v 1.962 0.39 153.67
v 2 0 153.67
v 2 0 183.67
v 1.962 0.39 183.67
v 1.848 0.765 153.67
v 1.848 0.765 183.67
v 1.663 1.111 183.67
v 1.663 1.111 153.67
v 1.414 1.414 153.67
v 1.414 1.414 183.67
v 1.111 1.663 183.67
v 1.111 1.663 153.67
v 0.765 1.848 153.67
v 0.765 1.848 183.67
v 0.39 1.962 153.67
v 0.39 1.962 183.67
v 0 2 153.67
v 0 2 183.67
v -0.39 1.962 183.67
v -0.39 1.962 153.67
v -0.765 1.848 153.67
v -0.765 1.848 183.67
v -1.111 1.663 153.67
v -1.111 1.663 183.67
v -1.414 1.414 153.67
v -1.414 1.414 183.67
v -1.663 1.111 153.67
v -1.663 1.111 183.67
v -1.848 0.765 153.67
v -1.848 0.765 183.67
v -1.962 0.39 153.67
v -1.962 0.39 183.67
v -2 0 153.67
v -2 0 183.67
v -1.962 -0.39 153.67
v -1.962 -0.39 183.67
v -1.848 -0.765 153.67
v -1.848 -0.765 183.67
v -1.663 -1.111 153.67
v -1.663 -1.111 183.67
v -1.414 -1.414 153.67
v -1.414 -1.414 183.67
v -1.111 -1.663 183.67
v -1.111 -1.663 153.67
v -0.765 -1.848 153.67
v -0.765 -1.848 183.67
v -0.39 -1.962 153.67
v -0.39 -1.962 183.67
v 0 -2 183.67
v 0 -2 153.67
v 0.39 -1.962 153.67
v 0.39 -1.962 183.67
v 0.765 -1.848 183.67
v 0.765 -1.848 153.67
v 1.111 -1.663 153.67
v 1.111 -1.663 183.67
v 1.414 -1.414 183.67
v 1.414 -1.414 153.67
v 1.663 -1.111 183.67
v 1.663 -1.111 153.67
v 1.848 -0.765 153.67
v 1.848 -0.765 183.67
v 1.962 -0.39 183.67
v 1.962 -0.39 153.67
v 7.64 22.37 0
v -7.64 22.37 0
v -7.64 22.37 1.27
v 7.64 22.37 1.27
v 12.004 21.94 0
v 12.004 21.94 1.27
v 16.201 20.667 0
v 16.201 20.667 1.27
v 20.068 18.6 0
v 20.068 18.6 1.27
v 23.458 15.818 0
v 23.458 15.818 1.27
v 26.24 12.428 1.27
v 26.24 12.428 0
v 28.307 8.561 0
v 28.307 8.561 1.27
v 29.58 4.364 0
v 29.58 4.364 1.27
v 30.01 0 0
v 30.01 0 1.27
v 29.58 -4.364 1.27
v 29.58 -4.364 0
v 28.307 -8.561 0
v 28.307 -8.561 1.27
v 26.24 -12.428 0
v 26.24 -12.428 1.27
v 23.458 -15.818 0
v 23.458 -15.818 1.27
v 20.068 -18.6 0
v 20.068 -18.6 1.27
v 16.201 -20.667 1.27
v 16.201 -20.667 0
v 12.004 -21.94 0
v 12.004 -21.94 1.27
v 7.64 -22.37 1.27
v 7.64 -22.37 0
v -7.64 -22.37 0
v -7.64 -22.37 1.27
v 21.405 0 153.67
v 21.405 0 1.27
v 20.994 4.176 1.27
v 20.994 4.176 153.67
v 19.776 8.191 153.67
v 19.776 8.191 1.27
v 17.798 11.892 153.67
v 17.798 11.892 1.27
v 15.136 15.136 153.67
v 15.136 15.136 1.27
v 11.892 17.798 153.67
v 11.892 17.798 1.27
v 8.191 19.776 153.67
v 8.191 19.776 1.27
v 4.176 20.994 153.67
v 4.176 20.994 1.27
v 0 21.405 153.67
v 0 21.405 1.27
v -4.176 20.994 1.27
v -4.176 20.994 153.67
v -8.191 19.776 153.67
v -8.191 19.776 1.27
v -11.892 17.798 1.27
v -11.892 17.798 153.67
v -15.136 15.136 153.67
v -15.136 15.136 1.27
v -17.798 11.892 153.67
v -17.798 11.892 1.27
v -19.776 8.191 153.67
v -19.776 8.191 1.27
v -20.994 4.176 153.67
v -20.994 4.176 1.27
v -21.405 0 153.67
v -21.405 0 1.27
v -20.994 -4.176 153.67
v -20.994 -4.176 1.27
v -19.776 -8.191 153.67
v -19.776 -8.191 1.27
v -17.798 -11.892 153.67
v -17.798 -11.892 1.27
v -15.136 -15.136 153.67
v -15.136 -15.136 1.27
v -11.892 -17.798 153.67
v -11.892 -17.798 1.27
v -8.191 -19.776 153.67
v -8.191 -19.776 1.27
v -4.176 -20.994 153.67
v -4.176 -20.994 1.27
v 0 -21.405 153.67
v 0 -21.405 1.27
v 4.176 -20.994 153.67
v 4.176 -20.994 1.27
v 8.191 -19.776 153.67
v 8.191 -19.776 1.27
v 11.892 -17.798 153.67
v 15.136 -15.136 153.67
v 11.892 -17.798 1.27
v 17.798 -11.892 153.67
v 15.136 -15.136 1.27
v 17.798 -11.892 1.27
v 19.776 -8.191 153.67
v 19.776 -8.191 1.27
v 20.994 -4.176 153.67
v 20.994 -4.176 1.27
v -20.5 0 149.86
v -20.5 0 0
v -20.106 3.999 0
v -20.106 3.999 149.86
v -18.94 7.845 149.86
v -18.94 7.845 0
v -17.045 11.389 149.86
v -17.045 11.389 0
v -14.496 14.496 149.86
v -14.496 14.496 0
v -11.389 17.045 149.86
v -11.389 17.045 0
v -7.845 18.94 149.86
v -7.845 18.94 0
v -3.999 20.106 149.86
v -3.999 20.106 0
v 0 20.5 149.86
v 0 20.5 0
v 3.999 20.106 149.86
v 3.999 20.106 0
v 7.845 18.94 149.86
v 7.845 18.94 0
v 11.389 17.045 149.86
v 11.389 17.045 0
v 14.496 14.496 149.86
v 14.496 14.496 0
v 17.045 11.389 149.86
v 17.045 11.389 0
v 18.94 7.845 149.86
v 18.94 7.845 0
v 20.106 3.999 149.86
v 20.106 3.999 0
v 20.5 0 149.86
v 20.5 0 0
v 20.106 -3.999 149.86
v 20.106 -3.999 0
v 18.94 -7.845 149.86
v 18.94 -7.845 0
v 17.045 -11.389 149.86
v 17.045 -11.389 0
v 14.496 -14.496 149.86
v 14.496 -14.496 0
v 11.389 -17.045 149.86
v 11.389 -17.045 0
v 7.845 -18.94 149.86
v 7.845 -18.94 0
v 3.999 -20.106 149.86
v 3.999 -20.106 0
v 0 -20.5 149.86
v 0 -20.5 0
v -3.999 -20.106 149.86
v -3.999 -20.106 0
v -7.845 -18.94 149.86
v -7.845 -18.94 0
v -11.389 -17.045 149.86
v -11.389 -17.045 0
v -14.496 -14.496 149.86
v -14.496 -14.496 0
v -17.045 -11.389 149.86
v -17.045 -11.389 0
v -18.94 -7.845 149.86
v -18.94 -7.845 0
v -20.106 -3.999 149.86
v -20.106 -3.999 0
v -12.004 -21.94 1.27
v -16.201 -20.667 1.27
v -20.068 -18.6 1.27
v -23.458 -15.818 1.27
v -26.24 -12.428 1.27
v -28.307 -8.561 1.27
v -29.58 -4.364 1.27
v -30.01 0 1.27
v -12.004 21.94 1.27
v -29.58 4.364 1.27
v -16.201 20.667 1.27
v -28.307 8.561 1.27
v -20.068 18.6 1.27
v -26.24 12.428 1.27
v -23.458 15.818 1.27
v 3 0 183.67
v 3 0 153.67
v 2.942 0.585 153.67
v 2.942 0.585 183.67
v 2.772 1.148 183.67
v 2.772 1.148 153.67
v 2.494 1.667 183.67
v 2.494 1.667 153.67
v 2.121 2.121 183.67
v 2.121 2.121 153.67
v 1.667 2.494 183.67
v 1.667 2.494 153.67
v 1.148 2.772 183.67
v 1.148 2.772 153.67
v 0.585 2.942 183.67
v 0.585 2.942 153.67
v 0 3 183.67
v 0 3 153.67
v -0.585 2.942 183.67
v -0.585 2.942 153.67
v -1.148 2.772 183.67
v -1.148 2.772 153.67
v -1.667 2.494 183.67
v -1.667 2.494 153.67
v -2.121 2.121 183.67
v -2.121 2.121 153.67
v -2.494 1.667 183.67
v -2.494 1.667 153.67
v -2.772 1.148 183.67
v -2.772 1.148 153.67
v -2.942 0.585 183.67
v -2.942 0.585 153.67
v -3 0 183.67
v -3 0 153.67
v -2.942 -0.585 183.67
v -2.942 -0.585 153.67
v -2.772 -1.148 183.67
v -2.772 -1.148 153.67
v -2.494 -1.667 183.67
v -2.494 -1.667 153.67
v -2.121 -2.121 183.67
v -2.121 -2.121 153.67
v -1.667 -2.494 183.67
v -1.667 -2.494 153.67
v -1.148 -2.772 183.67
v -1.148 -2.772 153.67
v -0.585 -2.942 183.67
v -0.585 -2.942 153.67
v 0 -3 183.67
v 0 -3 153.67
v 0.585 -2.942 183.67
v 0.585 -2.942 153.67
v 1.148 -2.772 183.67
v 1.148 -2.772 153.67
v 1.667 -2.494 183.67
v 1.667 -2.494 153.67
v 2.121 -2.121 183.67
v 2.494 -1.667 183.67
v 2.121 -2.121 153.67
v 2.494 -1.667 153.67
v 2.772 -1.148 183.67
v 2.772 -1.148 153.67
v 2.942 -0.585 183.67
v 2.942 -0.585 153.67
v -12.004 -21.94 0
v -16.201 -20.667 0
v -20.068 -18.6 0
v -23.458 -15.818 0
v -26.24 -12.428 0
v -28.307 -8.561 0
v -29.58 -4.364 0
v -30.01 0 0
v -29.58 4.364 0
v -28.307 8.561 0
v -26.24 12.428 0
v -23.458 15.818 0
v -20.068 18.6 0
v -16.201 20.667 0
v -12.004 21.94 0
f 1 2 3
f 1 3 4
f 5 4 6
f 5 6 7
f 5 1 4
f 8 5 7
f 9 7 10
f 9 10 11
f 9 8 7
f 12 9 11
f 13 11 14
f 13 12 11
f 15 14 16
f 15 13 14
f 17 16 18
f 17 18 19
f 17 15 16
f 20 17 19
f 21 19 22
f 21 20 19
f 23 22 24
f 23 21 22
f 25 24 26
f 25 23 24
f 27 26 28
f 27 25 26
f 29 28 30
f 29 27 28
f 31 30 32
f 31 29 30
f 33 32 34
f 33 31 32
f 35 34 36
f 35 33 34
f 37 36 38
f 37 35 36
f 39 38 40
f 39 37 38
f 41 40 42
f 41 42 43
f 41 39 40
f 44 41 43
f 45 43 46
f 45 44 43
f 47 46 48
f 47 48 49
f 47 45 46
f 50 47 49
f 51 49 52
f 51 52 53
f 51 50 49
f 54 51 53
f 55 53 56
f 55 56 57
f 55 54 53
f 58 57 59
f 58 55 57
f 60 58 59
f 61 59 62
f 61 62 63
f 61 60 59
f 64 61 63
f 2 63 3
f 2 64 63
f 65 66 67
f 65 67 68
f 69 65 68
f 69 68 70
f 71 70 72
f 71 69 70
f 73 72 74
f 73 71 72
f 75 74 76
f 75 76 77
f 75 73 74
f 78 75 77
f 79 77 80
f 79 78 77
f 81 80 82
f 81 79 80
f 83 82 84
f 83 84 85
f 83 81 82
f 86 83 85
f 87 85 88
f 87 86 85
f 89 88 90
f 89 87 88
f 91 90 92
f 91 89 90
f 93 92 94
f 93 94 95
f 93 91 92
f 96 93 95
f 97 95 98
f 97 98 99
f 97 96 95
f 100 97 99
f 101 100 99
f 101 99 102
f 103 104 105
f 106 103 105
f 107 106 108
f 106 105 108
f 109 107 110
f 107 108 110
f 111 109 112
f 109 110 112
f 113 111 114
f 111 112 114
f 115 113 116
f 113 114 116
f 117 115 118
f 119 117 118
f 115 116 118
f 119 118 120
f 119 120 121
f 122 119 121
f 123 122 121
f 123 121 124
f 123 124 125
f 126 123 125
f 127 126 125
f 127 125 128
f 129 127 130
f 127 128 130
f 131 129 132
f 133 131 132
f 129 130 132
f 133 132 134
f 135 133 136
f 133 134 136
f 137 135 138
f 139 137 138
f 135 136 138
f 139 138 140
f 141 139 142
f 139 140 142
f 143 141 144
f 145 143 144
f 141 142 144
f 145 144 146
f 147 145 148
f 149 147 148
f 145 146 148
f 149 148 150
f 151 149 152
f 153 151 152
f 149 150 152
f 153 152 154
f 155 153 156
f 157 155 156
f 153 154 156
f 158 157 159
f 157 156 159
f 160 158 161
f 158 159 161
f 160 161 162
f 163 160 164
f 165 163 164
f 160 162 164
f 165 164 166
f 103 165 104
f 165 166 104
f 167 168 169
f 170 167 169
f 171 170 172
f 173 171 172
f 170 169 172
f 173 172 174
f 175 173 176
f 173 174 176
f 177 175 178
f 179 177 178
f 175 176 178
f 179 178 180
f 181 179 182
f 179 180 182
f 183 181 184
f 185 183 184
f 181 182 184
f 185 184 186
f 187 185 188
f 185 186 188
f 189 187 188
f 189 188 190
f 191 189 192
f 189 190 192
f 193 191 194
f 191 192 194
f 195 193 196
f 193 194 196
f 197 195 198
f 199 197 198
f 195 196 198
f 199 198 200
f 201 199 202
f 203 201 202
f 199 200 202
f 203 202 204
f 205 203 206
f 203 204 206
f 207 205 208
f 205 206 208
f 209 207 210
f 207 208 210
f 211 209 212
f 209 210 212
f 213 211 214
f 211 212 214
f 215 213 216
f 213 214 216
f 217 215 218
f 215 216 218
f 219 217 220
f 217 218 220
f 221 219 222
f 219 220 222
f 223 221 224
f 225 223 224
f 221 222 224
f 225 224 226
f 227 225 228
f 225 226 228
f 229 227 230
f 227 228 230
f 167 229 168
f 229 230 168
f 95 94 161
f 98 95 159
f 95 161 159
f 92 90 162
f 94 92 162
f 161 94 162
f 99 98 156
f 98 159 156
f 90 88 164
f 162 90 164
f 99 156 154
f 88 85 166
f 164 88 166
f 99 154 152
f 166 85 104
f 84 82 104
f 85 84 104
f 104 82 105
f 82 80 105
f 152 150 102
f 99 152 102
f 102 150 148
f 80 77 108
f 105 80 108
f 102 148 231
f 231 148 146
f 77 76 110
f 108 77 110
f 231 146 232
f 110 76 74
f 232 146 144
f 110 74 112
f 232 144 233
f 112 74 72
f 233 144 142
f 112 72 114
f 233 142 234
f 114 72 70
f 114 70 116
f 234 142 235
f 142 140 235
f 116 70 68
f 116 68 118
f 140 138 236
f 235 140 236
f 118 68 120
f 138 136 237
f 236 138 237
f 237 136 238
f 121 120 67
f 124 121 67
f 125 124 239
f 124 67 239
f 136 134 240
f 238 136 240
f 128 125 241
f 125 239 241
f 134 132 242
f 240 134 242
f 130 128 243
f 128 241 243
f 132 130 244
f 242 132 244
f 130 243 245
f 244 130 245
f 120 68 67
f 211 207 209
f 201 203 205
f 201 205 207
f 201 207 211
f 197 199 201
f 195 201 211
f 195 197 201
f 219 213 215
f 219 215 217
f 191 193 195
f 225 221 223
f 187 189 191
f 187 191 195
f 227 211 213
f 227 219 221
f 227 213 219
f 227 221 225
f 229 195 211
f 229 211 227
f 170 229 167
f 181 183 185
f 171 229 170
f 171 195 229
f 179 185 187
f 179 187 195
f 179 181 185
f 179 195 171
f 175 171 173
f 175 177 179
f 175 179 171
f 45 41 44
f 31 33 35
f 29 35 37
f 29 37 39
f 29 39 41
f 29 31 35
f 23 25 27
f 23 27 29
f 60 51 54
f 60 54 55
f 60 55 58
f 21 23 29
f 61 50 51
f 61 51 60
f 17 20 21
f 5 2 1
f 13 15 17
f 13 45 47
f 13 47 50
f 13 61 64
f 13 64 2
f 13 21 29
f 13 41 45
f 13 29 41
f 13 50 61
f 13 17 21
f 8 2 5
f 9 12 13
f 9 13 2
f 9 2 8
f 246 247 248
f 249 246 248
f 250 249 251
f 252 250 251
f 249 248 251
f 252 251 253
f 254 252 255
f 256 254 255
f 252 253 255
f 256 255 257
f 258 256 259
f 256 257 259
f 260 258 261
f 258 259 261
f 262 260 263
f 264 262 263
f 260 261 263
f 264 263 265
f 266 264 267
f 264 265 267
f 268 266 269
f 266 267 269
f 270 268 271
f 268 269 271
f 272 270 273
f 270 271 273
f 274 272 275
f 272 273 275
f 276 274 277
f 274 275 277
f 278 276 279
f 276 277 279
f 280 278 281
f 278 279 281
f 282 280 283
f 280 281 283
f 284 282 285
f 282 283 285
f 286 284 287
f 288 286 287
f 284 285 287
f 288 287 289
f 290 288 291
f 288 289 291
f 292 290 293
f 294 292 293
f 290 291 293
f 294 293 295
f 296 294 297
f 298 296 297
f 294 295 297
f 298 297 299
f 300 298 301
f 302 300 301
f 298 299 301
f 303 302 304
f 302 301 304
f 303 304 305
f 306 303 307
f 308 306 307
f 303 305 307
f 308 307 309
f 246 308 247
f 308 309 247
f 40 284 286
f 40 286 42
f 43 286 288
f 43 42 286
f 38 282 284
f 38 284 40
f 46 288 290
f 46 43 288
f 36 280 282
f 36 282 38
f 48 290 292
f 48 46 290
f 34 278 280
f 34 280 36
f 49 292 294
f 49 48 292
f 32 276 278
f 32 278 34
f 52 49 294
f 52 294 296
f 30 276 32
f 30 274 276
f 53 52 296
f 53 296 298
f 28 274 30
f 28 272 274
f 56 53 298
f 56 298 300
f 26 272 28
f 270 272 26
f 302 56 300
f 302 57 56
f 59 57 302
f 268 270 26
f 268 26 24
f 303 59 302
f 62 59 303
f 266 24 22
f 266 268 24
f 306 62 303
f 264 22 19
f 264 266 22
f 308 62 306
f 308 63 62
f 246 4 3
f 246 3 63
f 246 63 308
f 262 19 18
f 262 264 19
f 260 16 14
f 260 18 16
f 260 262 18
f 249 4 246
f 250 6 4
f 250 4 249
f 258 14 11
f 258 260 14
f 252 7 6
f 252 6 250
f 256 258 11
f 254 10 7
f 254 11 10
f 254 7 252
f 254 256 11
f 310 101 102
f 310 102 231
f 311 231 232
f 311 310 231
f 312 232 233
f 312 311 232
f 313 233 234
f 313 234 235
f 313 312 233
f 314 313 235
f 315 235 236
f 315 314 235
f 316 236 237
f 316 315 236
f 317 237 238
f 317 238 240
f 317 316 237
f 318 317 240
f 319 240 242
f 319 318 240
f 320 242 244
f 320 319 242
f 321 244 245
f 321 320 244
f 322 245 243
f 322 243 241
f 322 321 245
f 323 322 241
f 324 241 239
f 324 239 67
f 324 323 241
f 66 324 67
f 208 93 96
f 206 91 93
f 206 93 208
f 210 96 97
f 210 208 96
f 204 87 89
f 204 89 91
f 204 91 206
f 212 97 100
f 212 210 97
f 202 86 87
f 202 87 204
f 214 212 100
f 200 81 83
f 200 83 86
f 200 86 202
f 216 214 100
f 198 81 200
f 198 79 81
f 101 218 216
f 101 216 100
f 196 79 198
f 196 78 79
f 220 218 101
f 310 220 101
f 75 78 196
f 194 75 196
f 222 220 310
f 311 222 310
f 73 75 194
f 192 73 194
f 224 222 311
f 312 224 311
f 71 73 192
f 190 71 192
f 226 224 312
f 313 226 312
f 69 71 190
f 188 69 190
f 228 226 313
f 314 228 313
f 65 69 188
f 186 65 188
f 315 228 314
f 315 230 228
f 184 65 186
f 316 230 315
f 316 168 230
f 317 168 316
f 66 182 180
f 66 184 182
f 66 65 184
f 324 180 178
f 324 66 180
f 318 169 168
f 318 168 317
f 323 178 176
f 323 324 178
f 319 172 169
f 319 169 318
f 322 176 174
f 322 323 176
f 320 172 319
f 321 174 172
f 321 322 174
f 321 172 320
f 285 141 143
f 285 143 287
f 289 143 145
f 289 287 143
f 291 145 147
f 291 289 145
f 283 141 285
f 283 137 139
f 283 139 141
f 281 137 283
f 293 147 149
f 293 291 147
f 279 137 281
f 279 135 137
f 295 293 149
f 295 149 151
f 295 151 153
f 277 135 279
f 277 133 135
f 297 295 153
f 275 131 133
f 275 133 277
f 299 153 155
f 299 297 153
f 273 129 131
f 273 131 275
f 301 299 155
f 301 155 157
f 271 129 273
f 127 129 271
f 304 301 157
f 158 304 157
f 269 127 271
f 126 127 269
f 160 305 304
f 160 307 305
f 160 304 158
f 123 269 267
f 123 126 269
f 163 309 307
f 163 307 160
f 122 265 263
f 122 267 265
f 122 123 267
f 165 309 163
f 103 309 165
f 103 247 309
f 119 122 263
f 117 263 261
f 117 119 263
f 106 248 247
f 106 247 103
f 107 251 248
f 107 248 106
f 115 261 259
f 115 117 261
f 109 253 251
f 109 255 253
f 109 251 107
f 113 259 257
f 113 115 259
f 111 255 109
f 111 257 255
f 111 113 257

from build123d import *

# Parameters (mm, degrees)
BOSS_EXTRUDE1_DEPTH = 1.27
SKETCH2_R           = 21.405
BOSS_EXTRUDE2_DEPTH = 152.4
SKETCH3_R           = 20.5
CUT_EXTRUDE1_DEPTH  = 149.86
SKETCH4_R           = 3
SKETCH4_R_2         = 2
BOSS_EXTRUDE3_DEPTH = 30


with BuildPart() as part:
    # Sketch1 → Boss-Extrude1 (new body)
    with BuildSketch(Plane.XY):
        with BuildLine():
            Line((-7.64, 22.37), (7.64, 22.37))
            ThreePointArc((7.64, 22.37), (30.01, 0), (7.64, -22.37))
            Line((7.64, -22.37), (-7.64, -22.37))
            ThreePointArc((-7.64, -22.37), (-30.01, 0), (-7.64, 22.37))
        make_face()
    extrude(amount=BOSS_EXTRUDE1_DEPTH)

    # Sketch2 → Boss-Extrude2 (add)
    with BuildSketch(Plane.XY.offset(1.27)):
        Circle(SKETCH2_R)
    extrude(amount=BOSS_EXTRUDE2_DEPTH)

    # Sketch3 → Cut-Extrude1 (cut)
    with BuildSketch(Plane(origin=(0, 0, 0), x_dir=(-1, 0, 0), z_dir=(0, 0, -1))):
        Circle(SKETCH3_R)
    extrude(amount=-CUT_EXTRUDE1_DEPTH, mode=Mode.SUBTRACT)

    # Sketch4 → Boss-Extrude3 (add)
    with BuildSketch(Plane.XY.offset(153.67)):
        Circle(SKETCH4_R)
        Circle(SKETCH4_R_2, mode=Mode.SUBTRACT)
    extrude(amount=BOSS_EXTRUDE3_DEPTH)


solid = part.part
